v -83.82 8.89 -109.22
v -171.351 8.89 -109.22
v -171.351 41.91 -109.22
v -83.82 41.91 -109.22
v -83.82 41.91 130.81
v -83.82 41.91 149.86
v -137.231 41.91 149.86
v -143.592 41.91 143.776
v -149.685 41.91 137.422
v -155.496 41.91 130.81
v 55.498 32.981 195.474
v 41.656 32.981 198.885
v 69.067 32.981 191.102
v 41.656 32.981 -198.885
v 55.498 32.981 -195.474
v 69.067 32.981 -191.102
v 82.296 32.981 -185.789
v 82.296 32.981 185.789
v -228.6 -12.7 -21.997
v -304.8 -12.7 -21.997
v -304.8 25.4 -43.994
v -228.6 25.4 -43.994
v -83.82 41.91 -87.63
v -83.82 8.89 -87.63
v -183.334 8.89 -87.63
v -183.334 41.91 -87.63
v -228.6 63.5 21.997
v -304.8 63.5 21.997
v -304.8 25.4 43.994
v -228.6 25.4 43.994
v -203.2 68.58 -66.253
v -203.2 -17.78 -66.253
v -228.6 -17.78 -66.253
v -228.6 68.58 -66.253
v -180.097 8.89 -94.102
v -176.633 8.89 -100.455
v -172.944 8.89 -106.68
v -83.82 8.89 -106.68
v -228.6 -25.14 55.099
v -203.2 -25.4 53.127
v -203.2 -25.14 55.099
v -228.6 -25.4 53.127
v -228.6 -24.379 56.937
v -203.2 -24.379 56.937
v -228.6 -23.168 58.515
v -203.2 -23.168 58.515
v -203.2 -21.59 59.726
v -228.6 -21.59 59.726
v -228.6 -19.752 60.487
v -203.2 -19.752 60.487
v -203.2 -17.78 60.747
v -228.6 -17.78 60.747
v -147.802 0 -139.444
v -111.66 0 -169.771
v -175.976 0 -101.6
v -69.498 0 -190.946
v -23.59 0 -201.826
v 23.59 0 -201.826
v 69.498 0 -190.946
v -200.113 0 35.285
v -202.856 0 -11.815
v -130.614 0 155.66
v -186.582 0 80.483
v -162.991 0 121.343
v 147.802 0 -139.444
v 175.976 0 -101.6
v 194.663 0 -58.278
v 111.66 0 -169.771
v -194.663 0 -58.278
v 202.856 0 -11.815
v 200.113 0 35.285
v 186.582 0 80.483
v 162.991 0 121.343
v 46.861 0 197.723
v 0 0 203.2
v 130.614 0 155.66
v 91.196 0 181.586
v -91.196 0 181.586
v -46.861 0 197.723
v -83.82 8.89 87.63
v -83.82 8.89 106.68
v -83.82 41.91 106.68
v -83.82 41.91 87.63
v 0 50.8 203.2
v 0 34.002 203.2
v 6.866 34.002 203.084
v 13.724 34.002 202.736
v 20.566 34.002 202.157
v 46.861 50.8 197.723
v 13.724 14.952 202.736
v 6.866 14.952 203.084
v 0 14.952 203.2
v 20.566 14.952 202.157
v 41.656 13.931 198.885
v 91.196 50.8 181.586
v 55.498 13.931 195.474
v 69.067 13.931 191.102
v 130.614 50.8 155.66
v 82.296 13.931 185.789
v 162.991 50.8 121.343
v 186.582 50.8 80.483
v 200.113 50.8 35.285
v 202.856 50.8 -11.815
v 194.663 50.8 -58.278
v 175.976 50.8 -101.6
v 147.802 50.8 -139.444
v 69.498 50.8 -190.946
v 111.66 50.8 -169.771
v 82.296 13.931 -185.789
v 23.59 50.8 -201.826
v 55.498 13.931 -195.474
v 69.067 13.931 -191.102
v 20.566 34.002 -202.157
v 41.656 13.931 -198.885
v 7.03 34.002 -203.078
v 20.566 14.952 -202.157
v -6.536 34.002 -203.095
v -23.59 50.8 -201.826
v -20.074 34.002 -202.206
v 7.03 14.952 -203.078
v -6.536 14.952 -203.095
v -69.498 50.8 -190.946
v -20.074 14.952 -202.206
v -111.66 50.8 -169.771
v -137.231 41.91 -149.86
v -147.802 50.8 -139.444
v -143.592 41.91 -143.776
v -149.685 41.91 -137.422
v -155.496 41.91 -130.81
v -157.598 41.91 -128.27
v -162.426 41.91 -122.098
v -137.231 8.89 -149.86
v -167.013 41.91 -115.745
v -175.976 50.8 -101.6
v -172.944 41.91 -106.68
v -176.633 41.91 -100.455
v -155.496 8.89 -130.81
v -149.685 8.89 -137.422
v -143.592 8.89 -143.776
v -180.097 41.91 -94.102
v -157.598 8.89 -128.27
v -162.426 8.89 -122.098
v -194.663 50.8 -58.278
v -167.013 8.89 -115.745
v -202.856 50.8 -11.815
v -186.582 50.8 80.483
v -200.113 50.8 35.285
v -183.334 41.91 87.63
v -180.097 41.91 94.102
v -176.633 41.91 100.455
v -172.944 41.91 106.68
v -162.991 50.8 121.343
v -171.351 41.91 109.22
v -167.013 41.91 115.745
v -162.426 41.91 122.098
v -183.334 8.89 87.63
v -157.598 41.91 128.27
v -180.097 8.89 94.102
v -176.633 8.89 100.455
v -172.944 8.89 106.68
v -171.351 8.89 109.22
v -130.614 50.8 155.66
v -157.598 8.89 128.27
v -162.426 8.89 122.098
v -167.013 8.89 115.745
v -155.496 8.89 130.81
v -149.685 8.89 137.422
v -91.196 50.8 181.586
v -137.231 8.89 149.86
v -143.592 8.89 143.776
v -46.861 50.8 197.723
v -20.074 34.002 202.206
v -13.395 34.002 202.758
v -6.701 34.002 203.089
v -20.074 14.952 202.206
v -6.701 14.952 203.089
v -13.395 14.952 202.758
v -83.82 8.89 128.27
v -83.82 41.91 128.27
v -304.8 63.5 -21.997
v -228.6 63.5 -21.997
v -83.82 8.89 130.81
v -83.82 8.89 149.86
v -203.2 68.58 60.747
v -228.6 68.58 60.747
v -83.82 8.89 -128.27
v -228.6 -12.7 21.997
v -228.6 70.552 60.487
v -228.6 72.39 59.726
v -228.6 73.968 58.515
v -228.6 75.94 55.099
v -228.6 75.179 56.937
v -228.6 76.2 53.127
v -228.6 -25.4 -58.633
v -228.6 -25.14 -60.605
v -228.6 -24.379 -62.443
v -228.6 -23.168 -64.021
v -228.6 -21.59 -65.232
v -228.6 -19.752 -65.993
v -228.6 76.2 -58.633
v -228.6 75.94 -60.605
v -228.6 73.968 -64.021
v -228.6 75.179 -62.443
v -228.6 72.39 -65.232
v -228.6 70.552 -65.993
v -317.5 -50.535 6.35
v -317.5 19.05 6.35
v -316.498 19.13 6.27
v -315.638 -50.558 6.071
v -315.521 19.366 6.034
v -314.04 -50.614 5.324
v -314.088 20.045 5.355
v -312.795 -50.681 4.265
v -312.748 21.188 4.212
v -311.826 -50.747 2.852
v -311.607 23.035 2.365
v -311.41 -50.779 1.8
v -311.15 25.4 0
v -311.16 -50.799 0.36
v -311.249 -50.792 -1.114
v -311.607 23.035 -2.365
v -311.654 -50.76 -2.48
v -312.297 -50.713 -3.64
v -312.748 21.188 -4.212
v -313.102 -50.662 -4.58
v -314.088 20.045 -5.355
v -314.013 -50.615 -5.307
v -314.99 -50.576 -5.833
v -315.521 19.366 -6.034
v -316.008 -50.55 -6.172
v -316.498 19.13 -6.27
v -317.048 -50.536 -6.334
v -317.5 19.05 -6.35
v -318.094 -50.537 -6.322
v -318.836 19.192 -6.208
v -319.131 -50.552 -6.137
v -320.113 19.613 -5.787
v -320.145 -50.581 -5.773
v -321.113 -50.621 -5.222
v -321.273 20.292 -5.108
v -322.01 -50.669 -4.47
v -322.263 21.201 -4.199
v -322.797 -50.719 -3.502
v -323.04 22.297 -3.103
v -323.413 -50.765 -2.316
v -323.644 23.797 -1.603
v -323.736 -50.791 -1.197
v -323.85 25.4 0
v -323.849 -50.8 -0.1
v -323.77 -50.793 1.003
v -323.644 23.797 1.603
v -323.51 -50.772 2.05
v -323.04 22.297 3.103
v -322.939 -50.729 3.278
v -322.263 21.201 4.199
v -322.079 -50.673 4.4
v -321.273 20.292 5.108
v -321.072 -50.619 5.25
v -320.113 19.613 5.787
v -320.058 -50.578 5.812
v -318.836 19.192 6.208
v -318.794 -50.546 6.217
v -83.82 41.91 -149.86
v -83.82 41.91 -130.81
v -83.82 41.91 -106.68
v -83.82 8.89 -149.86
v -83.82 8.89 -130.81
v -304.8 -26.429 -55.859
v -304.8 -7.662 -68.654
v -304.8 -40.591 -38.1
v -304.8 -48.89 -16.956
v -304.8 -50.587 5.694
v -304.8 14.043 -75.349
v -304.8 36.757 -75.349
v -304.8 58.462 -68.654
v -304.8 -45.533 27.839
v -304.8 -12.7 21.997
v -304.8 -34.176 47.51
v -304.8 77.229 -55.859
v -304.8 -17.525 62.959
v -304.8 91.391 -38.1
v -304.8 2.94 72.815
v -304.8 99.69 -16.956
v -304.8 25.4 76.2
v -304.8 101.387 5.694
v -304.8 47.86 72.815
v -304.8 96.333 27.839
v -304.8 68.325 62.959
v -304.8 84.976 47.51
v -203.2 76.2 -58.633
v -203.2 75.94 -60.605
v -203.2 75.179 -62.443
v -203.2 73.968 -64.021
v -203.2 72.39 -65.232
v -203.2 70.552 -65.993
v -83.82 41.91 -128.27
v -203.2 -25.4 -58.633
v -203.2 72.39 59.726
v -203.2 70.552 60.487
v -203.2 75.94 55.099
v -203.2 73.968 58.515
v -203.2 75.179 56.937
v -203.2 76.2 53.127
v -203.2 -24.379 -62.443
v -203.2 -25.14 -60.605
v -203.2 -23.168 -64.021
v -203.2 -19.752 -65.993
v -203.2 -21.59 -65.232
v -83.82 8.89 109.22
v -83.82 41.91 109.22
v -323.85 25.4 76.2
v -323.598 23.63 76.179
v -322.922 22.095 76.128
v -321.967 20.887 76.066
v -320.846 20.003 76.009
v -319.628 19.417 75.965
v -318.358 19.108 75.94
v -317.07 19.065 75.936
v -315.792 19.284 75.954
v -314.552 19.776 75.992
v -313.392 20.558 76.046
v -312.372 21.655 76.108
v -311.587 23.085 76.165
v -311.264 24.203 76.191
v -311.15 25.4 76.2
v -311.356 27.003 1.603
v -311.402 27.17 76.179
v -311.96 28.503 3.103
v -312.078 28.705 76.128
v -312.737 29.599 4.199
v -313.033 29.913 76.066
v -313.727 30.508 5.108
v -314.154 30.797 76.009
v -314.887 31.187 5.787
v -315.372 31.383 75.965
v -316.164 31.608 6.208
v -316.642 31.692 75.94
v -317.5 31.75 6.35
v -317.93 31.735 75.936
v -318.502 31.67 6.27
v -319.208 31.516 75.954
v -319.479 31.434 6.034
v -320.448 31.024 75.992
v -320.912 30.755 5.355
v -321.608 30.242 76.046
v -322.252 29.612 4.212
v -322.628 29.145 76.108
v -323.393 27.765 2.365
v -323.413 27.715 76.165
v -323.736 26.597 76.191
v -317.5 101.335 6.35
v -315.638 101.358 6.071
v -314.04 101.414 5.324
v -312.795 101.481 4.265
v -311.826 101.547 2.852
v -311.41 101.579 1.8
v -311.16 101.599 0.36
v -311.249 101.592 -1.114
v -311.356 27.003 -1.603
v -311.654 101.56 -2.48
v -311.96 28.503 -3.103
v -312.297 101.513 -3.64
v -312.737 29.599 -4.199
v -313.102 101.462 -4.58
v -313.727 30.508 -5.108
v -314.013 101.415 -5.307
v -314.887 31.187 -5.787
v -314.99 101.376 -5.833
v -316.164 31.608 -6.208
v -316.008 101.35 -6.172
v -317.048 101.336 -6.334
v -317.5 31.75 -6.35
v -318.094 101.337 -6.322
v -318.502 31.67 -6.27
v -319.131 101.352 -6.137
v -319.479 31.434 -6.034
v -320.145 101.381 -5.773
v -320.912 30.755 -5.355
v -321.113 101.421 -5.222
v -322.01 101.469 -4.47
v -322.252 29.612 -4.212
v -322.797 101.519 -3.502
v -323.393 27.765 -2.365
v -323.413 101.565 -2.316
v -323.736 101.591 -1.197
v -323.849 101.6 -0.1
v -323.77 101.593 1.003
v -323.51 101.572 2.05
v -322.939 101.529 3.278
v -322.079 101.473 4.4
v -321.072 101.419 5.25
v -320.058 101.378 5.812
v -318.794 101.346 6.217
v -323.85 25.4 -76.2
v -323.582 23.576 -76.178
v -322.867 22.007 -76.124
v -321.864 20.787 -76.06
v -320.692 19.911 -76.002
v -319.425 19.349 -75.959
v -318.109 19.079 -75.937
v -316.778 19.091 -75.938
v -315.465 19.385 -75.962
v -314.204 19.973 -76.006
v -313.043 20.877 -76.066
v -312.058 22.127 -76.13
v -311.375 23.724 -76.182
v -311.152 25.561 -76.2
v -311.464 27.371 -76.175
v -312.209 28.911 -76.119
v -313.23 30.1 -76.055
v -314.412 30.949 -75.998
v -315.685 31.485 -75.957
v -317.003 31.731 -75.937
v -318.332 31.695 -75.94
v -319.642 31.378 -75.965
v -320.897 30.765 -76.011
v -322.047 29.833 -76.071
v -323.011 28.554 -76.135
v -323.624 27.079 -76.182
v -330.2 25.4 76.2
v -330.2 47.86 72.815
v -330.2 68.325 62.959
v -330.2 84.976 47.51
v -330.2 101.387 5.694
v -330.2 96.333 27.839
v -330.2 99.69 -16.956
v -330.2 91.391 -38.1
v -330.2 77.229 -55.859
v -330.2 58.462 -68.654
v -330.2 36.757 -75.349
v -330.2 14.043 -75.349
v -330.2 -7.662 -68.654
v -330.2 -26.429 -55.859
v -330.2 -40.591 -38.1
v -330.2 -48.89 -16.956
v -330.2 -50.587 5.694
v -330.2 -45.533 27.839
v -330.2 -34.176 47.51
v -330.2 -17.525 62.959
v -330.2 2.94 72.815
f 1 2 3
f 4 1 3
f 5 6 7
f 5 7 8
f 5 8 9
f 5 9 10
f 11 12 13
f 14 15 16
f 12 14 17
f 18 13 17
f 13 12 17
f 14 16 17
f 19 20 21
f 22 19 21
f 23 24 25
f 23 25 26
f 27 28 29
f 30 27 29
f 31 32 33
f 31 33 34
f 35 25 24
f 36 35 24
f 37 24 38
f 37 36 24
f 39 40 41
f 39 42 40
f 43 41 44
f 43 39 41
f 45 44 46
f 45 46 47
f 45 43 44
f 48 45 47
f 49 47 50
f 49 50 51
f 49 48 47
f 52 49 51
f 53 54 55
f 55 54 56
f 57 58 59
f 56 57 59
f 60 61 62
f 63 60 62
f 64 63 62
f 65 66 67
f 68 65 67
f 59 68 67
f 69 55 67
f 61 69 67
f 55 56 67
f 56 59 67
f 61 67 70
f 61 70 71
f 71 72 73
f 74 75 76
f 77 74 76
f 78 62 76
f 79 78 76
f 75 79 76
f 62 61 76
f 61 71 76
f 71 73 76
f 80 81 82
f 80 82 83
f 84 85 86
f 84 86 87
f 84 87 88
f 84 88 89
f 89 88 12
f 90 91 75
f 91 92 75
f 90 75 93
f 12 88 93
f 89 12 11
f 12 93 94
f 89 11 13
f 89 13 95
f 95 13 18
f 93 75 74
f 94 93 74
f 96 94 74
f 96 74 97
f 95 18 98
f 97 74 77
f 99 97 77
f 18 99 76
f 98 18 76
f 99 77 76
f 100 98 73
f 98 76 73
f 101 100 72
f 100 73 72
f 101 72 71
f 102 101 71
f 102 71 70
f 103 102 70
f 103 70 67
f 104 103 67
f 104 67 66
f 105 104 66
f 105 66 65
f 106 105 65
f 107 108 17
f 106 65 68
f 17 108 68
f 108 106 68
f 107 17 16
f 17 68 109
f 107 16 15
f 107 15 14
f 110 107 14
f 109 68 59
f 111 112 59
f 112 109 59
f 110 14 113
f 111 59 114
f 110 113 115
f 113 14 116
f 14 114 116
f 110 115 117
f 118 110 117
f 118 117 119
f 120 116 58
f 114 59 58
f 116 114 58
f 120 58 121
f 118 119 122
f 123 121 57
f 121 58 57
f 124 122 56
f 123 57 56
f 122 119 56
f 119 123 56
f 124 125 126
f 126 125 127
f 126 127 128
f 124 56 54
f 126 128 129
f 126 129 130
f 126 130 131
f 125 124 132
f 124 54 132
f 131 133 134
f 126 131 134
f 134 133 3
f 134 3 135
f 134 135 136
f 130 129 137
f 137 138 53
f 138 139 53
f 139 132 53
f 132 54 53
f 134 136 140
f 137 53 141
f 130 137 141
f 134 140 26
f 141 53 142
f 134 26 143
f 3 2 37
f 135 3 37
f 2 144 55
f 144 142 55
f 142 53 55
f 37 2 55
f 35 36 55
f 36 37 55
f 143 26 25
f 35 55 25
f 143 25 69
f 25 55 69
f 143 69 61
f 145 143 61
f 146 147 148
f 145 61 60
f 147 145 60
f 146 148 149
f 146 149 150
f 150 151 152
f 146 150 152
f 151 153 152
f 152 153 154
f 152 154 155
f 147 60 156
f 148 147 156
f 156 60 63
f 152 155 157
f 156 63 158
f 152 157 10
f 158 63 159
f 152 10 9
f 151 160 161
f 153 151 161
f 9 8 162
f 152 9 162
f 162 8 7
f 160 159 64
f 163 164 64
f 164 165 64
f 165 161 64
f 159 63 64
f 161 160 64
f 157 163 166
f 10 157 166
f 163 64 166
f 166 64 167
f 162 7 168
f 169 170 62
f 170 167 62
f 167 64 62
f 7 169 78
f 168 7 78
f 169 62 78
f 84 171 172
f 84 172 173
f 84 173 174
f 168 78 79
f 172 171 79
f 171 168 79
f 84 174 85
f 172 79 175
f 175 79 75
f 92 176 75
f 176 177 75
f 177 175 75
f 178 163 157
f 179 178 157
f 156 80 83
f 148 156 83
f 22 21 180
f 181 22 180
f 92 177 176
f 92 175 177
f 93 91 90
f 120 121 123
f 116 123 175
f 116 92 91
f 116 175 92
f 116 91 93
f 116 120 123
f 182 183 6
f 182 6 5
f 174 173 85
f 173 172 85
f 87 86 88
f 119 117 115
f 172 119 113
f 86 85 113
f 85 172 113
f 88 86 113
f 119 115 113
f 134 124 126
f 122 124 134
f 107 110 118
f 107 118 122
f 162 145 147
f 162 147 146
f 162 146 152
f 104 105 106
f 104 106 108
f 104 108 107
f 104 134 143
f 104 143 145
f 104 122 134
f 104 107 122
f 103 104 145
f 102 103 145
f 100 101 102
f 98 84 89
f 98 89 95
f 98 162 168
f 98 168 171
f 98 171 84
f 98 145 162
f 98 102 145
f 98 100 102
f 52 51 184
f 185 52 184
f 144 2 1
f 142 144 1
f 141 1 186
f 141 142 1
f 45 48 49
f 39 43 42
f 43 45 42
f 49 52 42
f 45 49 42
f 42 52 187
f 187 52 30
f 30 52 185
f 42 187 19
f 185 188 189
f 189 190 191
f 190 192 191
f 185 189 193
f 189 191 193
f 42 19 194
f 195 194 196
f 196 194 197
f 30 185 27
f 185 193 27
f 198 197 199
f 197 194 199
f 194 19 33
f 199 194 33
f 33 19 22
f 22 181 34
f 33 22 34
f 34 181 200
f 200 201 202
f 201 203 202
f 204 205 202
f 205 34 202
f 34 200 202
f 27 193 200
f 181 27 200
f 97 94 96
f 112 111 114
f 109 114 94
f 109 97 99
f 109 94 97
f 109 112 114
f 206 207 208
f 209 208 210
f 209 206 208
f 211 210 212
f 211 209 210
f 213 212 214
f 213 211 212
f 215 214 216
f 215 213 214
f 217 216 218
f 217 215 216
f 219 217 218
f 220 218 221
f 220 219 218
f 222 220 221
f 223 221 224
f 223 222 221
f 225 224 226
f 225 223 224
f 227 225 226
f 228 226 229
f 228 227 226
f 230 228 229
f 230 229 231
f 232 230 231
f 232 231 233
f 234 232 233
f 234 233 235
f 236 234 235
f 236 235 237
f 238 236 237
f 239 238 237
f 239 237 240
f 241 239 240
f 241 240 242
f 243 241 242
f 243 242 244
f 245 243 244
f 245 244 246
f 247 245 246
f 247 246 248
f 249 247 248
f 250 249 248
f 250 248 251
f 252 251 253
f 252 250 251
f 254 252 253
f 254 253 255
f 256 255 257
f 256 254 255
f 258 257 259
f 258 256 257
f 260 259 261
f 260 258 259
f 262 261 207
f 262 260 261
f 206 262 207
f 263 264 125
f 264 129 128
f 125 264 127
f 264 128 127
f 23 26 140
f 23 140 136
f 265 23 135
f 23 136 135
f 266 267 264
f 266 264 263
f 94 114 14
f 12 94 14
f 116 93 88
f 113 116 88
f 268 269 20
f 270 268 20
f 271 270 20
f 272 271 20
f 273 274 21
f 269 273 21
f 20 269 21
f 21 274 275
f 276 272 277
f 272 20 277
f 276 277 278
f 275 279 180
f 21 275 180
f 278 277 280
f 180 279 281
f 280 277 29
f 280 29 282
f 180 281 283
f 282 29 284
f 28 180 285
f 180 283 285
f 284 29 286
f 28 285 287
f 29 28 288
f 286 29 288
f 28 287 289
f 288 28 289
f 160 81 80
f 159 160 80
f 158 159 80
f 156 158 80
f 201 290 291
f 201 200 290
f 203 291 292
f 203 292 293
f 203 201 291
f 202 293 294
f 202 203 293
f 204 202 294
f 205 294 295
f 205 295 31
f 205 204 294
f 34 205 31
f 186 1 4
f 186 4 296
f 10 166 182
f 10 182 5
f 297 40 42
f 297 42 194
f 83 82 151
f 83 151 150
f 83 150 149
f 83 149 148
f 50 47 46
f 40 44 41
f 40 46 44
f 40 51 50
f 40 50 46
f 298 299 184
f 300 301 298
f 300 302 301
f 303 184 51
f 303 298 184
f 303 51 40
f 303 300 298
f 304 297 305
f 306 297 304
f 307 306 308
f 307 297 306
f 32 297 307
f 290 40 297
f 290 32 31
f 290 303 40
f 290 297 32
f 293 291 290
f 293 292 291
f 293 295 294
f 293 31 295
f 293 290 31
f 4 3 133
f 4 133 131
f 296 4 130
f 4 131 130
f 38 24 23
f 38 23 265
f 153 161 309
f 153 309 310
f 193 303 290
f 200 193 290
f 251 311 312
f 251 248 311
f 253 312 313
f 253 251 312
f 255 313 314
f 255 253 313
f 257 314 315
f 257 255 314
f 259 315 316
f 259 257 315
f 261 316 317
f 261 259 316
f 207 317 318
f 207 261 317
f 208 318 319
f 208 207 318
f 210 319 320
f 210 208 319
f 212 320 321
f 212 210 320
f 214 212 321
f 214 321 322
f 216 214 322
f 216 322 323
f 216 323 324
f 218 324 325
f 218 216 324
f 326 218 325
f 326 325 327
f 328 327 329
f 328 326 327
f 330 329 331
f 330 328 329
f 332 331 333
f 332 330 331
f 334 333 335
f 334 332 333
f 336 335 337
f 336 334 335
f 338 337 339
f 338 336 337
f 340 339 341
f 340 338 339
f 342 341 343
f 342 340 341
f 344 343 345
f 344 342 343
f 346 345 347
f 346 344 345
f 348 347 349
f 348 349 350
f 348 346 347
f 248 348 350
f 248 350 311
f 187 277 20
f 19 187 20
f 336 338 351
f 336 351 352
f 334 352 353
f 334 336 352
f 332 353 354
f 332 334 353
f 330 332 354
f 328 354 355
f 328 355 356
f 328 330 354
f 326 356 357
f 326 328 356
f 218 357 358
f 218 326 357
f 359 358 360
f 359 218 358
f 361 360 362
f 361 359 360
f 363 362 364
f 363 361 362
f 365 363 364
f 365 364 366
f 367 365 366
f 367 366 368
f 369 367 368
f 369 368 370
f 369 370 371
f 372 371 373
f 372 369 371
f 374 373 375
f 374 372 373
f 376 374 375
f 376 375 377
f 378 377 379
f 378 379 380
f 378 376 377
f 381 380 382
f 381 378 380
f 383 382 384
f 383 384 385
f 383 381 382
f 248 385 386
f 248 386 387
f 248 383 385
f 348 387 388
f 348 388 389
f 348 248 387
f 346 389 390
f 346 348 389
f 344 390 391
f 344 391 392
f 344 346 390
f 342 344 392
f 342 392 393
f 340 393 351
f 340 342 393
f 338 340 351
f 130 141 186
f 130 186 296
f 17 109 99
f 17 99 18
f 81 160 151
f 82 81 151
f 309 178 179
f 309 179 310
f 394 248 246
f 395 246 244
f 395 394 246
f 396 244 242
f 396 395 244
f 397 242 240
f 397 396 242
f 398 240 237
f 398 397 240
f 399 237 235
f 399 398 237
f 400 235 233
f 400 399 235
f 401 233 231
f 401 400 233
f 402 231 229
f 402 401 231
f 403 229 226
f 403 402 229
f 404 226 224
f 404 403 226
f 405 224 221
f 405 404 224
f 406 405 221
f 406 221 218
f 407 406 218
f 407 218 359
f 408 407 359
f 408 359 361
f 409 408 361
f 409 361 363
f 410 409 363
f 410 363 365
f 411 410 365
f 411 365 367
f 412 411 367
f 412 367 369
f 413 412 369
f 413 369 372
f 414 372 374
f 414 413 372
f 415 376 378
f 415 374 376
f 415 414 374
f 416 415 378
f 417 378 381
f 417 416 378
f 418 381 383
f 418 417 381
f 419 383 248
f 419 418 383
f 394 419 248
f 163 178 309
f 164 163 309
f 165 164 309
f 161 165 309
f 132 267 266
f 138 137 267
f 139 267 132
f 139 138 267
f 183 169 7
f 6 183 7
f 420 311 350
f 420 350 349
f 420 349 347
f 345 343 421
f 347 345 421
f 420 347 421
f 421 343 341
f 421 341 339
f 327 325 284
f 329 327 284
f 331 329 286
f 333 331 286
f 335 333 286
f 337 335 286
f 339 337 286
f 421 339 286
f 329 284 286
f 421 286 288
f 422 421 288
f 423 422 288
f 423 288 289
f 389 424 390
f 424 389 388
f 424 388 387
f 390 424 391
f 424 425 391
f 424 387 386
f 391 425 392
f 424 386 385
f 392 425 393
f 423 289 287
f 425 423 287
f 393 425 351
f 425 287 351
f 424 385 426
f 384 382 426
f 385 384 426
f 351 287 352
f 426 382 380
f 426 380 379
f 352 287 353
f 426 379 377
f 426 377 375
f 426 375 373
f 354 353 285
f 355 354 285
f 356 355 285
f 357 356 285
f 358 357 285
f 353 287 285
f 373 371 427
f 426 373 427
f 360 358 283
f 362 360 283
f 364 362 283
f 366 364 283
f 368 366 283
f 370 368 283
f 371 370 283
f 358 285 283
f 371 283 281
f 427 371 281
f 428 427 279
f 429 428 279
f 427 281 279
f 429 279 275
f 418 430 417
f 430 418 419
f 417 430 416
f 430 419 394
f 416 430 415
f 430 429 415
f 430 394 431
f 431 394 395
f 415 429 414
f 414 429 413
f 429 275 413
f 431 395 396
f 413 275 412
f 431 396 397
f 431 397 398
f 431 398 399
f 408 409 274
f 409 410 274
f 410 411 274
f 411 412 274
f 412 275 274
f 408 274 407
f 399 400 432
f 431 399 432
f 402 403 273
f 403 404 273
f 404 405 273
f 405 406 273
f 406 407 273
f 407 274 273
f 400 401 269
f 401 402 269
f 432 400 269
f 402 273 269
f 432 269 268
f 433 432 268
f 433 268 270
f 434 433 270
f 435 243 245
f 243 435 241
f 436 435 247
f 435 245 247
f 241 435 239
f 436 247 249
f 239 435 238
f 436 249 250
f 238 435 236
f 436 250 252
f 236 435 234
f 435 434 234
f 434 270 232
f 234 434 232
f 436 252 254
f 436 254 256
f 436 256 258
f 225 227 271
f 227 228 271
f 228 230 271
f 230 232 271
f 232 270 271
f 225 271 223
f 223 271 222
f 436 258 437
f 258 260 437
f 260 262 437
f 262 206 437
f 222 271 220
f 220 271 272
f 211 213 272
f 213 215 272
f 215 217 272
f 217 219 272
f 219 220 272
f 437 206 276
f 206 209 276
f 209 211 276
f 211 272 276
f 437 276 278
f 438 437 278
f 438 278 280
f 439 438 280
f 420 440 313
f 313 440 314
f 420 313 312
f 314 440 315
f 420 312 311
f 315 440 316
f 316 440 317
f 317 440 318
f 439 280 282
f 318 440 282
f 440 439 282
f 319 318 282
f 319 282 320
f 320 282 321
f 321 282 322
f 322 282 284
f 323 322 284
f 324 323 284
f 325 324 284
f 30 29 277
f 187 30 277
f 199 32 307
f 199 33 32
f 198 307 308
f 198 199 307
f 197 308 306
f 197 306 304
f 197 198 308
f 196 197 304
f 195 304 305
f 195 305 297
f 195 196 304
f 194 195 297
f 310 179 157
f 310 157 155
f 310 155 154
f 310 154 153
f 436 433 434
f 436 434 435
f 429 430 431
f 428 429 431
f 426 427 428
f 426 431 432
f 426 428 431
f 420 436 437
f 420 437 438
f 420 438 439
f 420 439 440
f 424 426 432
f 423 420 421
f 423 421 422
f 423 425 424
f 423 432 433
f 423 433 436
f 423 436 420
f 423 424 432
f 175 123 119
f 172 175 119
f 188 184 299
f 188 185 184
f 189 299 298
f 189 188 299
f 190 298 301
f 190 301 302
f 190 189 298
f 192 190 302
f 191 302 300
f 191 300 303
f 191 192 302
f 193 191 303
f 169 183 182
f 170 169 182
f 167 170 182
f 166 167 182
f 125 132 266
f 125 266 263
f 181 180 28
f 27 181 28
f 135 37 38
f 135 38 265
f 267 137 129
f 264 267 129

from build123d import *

# Parameters (mm, degrees)
SKETCH2_R               = 203.2
BOSS_EXTRUDE1_DEPTH     = 50.8
SKETCH6_W               = 127
SKETCH6_H               = 101.6
BOSS_EXTRUDE4_DEPTH     = 25.4
BOSS_EXTRUDE5_DEPTH     = 76.2
SKETCH8_R               = 76.2
BOSS_EXTRUDE6_DEPTH     = 25.4
CUT_EXTRUDE1_DEPTH      = 401.805239487
CUT_EXTRUDE1_DEPTH_BACK = 401.805239487
SKETCH9_R               = 6.35
CUT_EXTRUDE2_DEPTH      = 401.805239594
CUT_EXTRUDE2_DEPTH_BACK = 401.805239594
SKETCH10_R              = 6.35
FILLET1_R               = 7.62
FILLET2_R               = 7.62
FILLET3_R               = 7.62
FILLET4_R               = 7.62
SKETCH11_W              = 19.05
SKETCH11_H              = 33.02
CUT_EXTRUDE3_DEPTH      = 119.38
CUT_EXTRUDE4_DEPTH      = 401.805239594
CUT_EXTRUDE4_DEPTH_BACK = 401.805239594
SKETCH12_W              = 40.64
SKETCH12_H              = 19.05


with BuildPart() as part:
    # Sketch2 → Boss-Extrude1 (new body)
    with BuildSketch(Plane(origin=(0, 0, 0), x_dir=(1, 0, 0), z_dir=(0, 1, 0))):
        with Locations(Location((0, 0, 0), (0, 0, 270))):
            Circle(SKETCH2_R)
    extrude(amount=BOSS_EXTRUDE1_DEPTH)

    # Sketch11 → Cut-Extrude3 (cut)
    with BuildSketch(Plane(origin=(-203.2, 0, 0), x_dir=(0, 0, -1), z_dir=(1, 0, 0))):
        with Locations((140.335, 25.4)):
            Rectangle(SKETCH11_W, SKETCH11_H)
        with Locations((118.745, 25.4)):
            Rectangle(SKETCH11_W, SKETCH11_H)
        with Locations((97.155, 25.4)):
            Rectangle(SKETCH11_W, SKETCH11_H)
        with Locations((-118.745, 25.4)):
            Rectangle(SKETCH11_W, SKETCH11_H)
        with Locations((-97.155, 25.4)):
            Rectangle(SKETCH11_W, SKETCH11_H)
        with Locations((-140.335, 25.4)):
            Rectangle(SKETCH11_W, SKETCH11_H)
    extrude(amount=CUT_EXTRUDE3_DEPTH, mode=Mode.SUBTRACT)

    # Sketch12 → Cut-Extrude4 (cut, two sides: drawn at the far end of the back side and taken through both)
    with BuildSketch(Plane.XY.offset(-CUT_EXTRUDE4_DEPTH_BACK)):
        with Locations((0.245955967, 24.477312463)):
            Rectangle(SKETCH12_W, SKETCH12_H)
        with Locations((61.975563372, 23.455854612)):
            Rectangle(SKETCH12_W, SKETCH12_H)
    extrude(amount=CUT_EXTRUDE4_DEPTH + CUT_EXTRUDE4_DEPTH_BACK, mode=Mode.SUBTRACT)


with BuildPart() as body_2:
    # Sketch6 → Boss-Extrude4 (new body)
    with BuildSketch(Plane(origin=(-203.2, 0, 0), x_dir=(0, 0, -1), z_dir=(1, 0, 0))):
        with Locations((2.752969814, 25.4)):
            Rectangle(SKETCH6_W, SKETCH6_H)
    extrude(amount=-BOSS_EXTRUDE4_DEPTH)

    # Sketch7 → Boss-Extrude5 (add)
    with BuildSketch(Plane(origin=(-228.6, 0, 0), x_dir=(0, 0, -1), z_dir=(1, 0, 0))):
        Polygon((-43.994090512, 25.4), (-21.997045256, -12.7), (21.997045256, -12.7), (43.994090512, 25.4), (21.997045256, 63.5), (-21.997045256, 63.5), align=None)
    extrude(amount=-BOSS_EXTRUDE5_DEPTH)

    # Sketch8 → Boss-Extrude6 (add)
    with BuildSketch(Plane.ZY.offset(304.8)):
        with Locations((0, 25.4)):
            Circle(SKETCH8_R)
    extrude(amount=BOSS_EXTRUDE6_DEPTH)

    # Sketch9 → Cut-Extrude1 (cut, two sides: drawn at the far end of the back side and taken through both)
    with BuildSketch(Plane.XY.offset(-CUT_EXTRUDE1_DEPTH_BACK)):
        with Locations(Location((-317.5, 25.4, 0), (0, 0, 180))):
            Circle(SKETCH9_R)
    extrude(amount=CUT_EXTRUDE1_DEPTH + CUT_EXTRUDE1_DEPTH_BACK, mode=Mode.SUBTRACT)

    # Sketch10 → Cut-Extrude2 (cut, two sides: drawn at the far end of the back side and taken through both)
    with BuildSketch(Plane(origin=(0, 0, 0), x_dir=(1, 0, 0), z_dir=(0, 1, 0)).offset(-CUT_EXTRUDE2_DEPTH_BACK)):
        with Locations(Location((-317.5, 0, 0), (0, 0, 270))):
            Circle(SKETCH10_R)
    extrude(amount=CUT_EXTRUDE2_DEPTH + CUT_EXTRUDE2_DEPTH_BACK, mode=Mode.SUBTRACT)

    # Fillet1
    fillet1_edges = [body_2.edges().sort_by_distance(p)[0] for p in [
        (-215.9, 76.2, -66.252969814),
    ]]
    fillet(fillet1_edges, radius=FILLET1_R)

    # Fillet2
    fillet2_edges = [body_2.edges().sort_by_distance(p)[0] for p in [
        (-215.9, -25.4, -66.252969814),
    ]]
    fillet(fillet2_edges, radius=FILLET2_R)

    # Fillet3
    fillet3_edges = [body_2.edges().sort_by_distance(p)[0] for p in [
        (-215.9, -25.4, 60.747030186),
    ]]
    fillet(fillet3_edges, radius=FILLET3_R)

    # Fillet4
    fillet4_edges = [body_2.edges().sort_by_distance(p)[0] for p in [
        (-215.9, 76.2, 60.747030186),
    ]]
    fillet(fillet4_edges, radius=FILLET4_R)


solid = Compound([part.part, body_2.part])
